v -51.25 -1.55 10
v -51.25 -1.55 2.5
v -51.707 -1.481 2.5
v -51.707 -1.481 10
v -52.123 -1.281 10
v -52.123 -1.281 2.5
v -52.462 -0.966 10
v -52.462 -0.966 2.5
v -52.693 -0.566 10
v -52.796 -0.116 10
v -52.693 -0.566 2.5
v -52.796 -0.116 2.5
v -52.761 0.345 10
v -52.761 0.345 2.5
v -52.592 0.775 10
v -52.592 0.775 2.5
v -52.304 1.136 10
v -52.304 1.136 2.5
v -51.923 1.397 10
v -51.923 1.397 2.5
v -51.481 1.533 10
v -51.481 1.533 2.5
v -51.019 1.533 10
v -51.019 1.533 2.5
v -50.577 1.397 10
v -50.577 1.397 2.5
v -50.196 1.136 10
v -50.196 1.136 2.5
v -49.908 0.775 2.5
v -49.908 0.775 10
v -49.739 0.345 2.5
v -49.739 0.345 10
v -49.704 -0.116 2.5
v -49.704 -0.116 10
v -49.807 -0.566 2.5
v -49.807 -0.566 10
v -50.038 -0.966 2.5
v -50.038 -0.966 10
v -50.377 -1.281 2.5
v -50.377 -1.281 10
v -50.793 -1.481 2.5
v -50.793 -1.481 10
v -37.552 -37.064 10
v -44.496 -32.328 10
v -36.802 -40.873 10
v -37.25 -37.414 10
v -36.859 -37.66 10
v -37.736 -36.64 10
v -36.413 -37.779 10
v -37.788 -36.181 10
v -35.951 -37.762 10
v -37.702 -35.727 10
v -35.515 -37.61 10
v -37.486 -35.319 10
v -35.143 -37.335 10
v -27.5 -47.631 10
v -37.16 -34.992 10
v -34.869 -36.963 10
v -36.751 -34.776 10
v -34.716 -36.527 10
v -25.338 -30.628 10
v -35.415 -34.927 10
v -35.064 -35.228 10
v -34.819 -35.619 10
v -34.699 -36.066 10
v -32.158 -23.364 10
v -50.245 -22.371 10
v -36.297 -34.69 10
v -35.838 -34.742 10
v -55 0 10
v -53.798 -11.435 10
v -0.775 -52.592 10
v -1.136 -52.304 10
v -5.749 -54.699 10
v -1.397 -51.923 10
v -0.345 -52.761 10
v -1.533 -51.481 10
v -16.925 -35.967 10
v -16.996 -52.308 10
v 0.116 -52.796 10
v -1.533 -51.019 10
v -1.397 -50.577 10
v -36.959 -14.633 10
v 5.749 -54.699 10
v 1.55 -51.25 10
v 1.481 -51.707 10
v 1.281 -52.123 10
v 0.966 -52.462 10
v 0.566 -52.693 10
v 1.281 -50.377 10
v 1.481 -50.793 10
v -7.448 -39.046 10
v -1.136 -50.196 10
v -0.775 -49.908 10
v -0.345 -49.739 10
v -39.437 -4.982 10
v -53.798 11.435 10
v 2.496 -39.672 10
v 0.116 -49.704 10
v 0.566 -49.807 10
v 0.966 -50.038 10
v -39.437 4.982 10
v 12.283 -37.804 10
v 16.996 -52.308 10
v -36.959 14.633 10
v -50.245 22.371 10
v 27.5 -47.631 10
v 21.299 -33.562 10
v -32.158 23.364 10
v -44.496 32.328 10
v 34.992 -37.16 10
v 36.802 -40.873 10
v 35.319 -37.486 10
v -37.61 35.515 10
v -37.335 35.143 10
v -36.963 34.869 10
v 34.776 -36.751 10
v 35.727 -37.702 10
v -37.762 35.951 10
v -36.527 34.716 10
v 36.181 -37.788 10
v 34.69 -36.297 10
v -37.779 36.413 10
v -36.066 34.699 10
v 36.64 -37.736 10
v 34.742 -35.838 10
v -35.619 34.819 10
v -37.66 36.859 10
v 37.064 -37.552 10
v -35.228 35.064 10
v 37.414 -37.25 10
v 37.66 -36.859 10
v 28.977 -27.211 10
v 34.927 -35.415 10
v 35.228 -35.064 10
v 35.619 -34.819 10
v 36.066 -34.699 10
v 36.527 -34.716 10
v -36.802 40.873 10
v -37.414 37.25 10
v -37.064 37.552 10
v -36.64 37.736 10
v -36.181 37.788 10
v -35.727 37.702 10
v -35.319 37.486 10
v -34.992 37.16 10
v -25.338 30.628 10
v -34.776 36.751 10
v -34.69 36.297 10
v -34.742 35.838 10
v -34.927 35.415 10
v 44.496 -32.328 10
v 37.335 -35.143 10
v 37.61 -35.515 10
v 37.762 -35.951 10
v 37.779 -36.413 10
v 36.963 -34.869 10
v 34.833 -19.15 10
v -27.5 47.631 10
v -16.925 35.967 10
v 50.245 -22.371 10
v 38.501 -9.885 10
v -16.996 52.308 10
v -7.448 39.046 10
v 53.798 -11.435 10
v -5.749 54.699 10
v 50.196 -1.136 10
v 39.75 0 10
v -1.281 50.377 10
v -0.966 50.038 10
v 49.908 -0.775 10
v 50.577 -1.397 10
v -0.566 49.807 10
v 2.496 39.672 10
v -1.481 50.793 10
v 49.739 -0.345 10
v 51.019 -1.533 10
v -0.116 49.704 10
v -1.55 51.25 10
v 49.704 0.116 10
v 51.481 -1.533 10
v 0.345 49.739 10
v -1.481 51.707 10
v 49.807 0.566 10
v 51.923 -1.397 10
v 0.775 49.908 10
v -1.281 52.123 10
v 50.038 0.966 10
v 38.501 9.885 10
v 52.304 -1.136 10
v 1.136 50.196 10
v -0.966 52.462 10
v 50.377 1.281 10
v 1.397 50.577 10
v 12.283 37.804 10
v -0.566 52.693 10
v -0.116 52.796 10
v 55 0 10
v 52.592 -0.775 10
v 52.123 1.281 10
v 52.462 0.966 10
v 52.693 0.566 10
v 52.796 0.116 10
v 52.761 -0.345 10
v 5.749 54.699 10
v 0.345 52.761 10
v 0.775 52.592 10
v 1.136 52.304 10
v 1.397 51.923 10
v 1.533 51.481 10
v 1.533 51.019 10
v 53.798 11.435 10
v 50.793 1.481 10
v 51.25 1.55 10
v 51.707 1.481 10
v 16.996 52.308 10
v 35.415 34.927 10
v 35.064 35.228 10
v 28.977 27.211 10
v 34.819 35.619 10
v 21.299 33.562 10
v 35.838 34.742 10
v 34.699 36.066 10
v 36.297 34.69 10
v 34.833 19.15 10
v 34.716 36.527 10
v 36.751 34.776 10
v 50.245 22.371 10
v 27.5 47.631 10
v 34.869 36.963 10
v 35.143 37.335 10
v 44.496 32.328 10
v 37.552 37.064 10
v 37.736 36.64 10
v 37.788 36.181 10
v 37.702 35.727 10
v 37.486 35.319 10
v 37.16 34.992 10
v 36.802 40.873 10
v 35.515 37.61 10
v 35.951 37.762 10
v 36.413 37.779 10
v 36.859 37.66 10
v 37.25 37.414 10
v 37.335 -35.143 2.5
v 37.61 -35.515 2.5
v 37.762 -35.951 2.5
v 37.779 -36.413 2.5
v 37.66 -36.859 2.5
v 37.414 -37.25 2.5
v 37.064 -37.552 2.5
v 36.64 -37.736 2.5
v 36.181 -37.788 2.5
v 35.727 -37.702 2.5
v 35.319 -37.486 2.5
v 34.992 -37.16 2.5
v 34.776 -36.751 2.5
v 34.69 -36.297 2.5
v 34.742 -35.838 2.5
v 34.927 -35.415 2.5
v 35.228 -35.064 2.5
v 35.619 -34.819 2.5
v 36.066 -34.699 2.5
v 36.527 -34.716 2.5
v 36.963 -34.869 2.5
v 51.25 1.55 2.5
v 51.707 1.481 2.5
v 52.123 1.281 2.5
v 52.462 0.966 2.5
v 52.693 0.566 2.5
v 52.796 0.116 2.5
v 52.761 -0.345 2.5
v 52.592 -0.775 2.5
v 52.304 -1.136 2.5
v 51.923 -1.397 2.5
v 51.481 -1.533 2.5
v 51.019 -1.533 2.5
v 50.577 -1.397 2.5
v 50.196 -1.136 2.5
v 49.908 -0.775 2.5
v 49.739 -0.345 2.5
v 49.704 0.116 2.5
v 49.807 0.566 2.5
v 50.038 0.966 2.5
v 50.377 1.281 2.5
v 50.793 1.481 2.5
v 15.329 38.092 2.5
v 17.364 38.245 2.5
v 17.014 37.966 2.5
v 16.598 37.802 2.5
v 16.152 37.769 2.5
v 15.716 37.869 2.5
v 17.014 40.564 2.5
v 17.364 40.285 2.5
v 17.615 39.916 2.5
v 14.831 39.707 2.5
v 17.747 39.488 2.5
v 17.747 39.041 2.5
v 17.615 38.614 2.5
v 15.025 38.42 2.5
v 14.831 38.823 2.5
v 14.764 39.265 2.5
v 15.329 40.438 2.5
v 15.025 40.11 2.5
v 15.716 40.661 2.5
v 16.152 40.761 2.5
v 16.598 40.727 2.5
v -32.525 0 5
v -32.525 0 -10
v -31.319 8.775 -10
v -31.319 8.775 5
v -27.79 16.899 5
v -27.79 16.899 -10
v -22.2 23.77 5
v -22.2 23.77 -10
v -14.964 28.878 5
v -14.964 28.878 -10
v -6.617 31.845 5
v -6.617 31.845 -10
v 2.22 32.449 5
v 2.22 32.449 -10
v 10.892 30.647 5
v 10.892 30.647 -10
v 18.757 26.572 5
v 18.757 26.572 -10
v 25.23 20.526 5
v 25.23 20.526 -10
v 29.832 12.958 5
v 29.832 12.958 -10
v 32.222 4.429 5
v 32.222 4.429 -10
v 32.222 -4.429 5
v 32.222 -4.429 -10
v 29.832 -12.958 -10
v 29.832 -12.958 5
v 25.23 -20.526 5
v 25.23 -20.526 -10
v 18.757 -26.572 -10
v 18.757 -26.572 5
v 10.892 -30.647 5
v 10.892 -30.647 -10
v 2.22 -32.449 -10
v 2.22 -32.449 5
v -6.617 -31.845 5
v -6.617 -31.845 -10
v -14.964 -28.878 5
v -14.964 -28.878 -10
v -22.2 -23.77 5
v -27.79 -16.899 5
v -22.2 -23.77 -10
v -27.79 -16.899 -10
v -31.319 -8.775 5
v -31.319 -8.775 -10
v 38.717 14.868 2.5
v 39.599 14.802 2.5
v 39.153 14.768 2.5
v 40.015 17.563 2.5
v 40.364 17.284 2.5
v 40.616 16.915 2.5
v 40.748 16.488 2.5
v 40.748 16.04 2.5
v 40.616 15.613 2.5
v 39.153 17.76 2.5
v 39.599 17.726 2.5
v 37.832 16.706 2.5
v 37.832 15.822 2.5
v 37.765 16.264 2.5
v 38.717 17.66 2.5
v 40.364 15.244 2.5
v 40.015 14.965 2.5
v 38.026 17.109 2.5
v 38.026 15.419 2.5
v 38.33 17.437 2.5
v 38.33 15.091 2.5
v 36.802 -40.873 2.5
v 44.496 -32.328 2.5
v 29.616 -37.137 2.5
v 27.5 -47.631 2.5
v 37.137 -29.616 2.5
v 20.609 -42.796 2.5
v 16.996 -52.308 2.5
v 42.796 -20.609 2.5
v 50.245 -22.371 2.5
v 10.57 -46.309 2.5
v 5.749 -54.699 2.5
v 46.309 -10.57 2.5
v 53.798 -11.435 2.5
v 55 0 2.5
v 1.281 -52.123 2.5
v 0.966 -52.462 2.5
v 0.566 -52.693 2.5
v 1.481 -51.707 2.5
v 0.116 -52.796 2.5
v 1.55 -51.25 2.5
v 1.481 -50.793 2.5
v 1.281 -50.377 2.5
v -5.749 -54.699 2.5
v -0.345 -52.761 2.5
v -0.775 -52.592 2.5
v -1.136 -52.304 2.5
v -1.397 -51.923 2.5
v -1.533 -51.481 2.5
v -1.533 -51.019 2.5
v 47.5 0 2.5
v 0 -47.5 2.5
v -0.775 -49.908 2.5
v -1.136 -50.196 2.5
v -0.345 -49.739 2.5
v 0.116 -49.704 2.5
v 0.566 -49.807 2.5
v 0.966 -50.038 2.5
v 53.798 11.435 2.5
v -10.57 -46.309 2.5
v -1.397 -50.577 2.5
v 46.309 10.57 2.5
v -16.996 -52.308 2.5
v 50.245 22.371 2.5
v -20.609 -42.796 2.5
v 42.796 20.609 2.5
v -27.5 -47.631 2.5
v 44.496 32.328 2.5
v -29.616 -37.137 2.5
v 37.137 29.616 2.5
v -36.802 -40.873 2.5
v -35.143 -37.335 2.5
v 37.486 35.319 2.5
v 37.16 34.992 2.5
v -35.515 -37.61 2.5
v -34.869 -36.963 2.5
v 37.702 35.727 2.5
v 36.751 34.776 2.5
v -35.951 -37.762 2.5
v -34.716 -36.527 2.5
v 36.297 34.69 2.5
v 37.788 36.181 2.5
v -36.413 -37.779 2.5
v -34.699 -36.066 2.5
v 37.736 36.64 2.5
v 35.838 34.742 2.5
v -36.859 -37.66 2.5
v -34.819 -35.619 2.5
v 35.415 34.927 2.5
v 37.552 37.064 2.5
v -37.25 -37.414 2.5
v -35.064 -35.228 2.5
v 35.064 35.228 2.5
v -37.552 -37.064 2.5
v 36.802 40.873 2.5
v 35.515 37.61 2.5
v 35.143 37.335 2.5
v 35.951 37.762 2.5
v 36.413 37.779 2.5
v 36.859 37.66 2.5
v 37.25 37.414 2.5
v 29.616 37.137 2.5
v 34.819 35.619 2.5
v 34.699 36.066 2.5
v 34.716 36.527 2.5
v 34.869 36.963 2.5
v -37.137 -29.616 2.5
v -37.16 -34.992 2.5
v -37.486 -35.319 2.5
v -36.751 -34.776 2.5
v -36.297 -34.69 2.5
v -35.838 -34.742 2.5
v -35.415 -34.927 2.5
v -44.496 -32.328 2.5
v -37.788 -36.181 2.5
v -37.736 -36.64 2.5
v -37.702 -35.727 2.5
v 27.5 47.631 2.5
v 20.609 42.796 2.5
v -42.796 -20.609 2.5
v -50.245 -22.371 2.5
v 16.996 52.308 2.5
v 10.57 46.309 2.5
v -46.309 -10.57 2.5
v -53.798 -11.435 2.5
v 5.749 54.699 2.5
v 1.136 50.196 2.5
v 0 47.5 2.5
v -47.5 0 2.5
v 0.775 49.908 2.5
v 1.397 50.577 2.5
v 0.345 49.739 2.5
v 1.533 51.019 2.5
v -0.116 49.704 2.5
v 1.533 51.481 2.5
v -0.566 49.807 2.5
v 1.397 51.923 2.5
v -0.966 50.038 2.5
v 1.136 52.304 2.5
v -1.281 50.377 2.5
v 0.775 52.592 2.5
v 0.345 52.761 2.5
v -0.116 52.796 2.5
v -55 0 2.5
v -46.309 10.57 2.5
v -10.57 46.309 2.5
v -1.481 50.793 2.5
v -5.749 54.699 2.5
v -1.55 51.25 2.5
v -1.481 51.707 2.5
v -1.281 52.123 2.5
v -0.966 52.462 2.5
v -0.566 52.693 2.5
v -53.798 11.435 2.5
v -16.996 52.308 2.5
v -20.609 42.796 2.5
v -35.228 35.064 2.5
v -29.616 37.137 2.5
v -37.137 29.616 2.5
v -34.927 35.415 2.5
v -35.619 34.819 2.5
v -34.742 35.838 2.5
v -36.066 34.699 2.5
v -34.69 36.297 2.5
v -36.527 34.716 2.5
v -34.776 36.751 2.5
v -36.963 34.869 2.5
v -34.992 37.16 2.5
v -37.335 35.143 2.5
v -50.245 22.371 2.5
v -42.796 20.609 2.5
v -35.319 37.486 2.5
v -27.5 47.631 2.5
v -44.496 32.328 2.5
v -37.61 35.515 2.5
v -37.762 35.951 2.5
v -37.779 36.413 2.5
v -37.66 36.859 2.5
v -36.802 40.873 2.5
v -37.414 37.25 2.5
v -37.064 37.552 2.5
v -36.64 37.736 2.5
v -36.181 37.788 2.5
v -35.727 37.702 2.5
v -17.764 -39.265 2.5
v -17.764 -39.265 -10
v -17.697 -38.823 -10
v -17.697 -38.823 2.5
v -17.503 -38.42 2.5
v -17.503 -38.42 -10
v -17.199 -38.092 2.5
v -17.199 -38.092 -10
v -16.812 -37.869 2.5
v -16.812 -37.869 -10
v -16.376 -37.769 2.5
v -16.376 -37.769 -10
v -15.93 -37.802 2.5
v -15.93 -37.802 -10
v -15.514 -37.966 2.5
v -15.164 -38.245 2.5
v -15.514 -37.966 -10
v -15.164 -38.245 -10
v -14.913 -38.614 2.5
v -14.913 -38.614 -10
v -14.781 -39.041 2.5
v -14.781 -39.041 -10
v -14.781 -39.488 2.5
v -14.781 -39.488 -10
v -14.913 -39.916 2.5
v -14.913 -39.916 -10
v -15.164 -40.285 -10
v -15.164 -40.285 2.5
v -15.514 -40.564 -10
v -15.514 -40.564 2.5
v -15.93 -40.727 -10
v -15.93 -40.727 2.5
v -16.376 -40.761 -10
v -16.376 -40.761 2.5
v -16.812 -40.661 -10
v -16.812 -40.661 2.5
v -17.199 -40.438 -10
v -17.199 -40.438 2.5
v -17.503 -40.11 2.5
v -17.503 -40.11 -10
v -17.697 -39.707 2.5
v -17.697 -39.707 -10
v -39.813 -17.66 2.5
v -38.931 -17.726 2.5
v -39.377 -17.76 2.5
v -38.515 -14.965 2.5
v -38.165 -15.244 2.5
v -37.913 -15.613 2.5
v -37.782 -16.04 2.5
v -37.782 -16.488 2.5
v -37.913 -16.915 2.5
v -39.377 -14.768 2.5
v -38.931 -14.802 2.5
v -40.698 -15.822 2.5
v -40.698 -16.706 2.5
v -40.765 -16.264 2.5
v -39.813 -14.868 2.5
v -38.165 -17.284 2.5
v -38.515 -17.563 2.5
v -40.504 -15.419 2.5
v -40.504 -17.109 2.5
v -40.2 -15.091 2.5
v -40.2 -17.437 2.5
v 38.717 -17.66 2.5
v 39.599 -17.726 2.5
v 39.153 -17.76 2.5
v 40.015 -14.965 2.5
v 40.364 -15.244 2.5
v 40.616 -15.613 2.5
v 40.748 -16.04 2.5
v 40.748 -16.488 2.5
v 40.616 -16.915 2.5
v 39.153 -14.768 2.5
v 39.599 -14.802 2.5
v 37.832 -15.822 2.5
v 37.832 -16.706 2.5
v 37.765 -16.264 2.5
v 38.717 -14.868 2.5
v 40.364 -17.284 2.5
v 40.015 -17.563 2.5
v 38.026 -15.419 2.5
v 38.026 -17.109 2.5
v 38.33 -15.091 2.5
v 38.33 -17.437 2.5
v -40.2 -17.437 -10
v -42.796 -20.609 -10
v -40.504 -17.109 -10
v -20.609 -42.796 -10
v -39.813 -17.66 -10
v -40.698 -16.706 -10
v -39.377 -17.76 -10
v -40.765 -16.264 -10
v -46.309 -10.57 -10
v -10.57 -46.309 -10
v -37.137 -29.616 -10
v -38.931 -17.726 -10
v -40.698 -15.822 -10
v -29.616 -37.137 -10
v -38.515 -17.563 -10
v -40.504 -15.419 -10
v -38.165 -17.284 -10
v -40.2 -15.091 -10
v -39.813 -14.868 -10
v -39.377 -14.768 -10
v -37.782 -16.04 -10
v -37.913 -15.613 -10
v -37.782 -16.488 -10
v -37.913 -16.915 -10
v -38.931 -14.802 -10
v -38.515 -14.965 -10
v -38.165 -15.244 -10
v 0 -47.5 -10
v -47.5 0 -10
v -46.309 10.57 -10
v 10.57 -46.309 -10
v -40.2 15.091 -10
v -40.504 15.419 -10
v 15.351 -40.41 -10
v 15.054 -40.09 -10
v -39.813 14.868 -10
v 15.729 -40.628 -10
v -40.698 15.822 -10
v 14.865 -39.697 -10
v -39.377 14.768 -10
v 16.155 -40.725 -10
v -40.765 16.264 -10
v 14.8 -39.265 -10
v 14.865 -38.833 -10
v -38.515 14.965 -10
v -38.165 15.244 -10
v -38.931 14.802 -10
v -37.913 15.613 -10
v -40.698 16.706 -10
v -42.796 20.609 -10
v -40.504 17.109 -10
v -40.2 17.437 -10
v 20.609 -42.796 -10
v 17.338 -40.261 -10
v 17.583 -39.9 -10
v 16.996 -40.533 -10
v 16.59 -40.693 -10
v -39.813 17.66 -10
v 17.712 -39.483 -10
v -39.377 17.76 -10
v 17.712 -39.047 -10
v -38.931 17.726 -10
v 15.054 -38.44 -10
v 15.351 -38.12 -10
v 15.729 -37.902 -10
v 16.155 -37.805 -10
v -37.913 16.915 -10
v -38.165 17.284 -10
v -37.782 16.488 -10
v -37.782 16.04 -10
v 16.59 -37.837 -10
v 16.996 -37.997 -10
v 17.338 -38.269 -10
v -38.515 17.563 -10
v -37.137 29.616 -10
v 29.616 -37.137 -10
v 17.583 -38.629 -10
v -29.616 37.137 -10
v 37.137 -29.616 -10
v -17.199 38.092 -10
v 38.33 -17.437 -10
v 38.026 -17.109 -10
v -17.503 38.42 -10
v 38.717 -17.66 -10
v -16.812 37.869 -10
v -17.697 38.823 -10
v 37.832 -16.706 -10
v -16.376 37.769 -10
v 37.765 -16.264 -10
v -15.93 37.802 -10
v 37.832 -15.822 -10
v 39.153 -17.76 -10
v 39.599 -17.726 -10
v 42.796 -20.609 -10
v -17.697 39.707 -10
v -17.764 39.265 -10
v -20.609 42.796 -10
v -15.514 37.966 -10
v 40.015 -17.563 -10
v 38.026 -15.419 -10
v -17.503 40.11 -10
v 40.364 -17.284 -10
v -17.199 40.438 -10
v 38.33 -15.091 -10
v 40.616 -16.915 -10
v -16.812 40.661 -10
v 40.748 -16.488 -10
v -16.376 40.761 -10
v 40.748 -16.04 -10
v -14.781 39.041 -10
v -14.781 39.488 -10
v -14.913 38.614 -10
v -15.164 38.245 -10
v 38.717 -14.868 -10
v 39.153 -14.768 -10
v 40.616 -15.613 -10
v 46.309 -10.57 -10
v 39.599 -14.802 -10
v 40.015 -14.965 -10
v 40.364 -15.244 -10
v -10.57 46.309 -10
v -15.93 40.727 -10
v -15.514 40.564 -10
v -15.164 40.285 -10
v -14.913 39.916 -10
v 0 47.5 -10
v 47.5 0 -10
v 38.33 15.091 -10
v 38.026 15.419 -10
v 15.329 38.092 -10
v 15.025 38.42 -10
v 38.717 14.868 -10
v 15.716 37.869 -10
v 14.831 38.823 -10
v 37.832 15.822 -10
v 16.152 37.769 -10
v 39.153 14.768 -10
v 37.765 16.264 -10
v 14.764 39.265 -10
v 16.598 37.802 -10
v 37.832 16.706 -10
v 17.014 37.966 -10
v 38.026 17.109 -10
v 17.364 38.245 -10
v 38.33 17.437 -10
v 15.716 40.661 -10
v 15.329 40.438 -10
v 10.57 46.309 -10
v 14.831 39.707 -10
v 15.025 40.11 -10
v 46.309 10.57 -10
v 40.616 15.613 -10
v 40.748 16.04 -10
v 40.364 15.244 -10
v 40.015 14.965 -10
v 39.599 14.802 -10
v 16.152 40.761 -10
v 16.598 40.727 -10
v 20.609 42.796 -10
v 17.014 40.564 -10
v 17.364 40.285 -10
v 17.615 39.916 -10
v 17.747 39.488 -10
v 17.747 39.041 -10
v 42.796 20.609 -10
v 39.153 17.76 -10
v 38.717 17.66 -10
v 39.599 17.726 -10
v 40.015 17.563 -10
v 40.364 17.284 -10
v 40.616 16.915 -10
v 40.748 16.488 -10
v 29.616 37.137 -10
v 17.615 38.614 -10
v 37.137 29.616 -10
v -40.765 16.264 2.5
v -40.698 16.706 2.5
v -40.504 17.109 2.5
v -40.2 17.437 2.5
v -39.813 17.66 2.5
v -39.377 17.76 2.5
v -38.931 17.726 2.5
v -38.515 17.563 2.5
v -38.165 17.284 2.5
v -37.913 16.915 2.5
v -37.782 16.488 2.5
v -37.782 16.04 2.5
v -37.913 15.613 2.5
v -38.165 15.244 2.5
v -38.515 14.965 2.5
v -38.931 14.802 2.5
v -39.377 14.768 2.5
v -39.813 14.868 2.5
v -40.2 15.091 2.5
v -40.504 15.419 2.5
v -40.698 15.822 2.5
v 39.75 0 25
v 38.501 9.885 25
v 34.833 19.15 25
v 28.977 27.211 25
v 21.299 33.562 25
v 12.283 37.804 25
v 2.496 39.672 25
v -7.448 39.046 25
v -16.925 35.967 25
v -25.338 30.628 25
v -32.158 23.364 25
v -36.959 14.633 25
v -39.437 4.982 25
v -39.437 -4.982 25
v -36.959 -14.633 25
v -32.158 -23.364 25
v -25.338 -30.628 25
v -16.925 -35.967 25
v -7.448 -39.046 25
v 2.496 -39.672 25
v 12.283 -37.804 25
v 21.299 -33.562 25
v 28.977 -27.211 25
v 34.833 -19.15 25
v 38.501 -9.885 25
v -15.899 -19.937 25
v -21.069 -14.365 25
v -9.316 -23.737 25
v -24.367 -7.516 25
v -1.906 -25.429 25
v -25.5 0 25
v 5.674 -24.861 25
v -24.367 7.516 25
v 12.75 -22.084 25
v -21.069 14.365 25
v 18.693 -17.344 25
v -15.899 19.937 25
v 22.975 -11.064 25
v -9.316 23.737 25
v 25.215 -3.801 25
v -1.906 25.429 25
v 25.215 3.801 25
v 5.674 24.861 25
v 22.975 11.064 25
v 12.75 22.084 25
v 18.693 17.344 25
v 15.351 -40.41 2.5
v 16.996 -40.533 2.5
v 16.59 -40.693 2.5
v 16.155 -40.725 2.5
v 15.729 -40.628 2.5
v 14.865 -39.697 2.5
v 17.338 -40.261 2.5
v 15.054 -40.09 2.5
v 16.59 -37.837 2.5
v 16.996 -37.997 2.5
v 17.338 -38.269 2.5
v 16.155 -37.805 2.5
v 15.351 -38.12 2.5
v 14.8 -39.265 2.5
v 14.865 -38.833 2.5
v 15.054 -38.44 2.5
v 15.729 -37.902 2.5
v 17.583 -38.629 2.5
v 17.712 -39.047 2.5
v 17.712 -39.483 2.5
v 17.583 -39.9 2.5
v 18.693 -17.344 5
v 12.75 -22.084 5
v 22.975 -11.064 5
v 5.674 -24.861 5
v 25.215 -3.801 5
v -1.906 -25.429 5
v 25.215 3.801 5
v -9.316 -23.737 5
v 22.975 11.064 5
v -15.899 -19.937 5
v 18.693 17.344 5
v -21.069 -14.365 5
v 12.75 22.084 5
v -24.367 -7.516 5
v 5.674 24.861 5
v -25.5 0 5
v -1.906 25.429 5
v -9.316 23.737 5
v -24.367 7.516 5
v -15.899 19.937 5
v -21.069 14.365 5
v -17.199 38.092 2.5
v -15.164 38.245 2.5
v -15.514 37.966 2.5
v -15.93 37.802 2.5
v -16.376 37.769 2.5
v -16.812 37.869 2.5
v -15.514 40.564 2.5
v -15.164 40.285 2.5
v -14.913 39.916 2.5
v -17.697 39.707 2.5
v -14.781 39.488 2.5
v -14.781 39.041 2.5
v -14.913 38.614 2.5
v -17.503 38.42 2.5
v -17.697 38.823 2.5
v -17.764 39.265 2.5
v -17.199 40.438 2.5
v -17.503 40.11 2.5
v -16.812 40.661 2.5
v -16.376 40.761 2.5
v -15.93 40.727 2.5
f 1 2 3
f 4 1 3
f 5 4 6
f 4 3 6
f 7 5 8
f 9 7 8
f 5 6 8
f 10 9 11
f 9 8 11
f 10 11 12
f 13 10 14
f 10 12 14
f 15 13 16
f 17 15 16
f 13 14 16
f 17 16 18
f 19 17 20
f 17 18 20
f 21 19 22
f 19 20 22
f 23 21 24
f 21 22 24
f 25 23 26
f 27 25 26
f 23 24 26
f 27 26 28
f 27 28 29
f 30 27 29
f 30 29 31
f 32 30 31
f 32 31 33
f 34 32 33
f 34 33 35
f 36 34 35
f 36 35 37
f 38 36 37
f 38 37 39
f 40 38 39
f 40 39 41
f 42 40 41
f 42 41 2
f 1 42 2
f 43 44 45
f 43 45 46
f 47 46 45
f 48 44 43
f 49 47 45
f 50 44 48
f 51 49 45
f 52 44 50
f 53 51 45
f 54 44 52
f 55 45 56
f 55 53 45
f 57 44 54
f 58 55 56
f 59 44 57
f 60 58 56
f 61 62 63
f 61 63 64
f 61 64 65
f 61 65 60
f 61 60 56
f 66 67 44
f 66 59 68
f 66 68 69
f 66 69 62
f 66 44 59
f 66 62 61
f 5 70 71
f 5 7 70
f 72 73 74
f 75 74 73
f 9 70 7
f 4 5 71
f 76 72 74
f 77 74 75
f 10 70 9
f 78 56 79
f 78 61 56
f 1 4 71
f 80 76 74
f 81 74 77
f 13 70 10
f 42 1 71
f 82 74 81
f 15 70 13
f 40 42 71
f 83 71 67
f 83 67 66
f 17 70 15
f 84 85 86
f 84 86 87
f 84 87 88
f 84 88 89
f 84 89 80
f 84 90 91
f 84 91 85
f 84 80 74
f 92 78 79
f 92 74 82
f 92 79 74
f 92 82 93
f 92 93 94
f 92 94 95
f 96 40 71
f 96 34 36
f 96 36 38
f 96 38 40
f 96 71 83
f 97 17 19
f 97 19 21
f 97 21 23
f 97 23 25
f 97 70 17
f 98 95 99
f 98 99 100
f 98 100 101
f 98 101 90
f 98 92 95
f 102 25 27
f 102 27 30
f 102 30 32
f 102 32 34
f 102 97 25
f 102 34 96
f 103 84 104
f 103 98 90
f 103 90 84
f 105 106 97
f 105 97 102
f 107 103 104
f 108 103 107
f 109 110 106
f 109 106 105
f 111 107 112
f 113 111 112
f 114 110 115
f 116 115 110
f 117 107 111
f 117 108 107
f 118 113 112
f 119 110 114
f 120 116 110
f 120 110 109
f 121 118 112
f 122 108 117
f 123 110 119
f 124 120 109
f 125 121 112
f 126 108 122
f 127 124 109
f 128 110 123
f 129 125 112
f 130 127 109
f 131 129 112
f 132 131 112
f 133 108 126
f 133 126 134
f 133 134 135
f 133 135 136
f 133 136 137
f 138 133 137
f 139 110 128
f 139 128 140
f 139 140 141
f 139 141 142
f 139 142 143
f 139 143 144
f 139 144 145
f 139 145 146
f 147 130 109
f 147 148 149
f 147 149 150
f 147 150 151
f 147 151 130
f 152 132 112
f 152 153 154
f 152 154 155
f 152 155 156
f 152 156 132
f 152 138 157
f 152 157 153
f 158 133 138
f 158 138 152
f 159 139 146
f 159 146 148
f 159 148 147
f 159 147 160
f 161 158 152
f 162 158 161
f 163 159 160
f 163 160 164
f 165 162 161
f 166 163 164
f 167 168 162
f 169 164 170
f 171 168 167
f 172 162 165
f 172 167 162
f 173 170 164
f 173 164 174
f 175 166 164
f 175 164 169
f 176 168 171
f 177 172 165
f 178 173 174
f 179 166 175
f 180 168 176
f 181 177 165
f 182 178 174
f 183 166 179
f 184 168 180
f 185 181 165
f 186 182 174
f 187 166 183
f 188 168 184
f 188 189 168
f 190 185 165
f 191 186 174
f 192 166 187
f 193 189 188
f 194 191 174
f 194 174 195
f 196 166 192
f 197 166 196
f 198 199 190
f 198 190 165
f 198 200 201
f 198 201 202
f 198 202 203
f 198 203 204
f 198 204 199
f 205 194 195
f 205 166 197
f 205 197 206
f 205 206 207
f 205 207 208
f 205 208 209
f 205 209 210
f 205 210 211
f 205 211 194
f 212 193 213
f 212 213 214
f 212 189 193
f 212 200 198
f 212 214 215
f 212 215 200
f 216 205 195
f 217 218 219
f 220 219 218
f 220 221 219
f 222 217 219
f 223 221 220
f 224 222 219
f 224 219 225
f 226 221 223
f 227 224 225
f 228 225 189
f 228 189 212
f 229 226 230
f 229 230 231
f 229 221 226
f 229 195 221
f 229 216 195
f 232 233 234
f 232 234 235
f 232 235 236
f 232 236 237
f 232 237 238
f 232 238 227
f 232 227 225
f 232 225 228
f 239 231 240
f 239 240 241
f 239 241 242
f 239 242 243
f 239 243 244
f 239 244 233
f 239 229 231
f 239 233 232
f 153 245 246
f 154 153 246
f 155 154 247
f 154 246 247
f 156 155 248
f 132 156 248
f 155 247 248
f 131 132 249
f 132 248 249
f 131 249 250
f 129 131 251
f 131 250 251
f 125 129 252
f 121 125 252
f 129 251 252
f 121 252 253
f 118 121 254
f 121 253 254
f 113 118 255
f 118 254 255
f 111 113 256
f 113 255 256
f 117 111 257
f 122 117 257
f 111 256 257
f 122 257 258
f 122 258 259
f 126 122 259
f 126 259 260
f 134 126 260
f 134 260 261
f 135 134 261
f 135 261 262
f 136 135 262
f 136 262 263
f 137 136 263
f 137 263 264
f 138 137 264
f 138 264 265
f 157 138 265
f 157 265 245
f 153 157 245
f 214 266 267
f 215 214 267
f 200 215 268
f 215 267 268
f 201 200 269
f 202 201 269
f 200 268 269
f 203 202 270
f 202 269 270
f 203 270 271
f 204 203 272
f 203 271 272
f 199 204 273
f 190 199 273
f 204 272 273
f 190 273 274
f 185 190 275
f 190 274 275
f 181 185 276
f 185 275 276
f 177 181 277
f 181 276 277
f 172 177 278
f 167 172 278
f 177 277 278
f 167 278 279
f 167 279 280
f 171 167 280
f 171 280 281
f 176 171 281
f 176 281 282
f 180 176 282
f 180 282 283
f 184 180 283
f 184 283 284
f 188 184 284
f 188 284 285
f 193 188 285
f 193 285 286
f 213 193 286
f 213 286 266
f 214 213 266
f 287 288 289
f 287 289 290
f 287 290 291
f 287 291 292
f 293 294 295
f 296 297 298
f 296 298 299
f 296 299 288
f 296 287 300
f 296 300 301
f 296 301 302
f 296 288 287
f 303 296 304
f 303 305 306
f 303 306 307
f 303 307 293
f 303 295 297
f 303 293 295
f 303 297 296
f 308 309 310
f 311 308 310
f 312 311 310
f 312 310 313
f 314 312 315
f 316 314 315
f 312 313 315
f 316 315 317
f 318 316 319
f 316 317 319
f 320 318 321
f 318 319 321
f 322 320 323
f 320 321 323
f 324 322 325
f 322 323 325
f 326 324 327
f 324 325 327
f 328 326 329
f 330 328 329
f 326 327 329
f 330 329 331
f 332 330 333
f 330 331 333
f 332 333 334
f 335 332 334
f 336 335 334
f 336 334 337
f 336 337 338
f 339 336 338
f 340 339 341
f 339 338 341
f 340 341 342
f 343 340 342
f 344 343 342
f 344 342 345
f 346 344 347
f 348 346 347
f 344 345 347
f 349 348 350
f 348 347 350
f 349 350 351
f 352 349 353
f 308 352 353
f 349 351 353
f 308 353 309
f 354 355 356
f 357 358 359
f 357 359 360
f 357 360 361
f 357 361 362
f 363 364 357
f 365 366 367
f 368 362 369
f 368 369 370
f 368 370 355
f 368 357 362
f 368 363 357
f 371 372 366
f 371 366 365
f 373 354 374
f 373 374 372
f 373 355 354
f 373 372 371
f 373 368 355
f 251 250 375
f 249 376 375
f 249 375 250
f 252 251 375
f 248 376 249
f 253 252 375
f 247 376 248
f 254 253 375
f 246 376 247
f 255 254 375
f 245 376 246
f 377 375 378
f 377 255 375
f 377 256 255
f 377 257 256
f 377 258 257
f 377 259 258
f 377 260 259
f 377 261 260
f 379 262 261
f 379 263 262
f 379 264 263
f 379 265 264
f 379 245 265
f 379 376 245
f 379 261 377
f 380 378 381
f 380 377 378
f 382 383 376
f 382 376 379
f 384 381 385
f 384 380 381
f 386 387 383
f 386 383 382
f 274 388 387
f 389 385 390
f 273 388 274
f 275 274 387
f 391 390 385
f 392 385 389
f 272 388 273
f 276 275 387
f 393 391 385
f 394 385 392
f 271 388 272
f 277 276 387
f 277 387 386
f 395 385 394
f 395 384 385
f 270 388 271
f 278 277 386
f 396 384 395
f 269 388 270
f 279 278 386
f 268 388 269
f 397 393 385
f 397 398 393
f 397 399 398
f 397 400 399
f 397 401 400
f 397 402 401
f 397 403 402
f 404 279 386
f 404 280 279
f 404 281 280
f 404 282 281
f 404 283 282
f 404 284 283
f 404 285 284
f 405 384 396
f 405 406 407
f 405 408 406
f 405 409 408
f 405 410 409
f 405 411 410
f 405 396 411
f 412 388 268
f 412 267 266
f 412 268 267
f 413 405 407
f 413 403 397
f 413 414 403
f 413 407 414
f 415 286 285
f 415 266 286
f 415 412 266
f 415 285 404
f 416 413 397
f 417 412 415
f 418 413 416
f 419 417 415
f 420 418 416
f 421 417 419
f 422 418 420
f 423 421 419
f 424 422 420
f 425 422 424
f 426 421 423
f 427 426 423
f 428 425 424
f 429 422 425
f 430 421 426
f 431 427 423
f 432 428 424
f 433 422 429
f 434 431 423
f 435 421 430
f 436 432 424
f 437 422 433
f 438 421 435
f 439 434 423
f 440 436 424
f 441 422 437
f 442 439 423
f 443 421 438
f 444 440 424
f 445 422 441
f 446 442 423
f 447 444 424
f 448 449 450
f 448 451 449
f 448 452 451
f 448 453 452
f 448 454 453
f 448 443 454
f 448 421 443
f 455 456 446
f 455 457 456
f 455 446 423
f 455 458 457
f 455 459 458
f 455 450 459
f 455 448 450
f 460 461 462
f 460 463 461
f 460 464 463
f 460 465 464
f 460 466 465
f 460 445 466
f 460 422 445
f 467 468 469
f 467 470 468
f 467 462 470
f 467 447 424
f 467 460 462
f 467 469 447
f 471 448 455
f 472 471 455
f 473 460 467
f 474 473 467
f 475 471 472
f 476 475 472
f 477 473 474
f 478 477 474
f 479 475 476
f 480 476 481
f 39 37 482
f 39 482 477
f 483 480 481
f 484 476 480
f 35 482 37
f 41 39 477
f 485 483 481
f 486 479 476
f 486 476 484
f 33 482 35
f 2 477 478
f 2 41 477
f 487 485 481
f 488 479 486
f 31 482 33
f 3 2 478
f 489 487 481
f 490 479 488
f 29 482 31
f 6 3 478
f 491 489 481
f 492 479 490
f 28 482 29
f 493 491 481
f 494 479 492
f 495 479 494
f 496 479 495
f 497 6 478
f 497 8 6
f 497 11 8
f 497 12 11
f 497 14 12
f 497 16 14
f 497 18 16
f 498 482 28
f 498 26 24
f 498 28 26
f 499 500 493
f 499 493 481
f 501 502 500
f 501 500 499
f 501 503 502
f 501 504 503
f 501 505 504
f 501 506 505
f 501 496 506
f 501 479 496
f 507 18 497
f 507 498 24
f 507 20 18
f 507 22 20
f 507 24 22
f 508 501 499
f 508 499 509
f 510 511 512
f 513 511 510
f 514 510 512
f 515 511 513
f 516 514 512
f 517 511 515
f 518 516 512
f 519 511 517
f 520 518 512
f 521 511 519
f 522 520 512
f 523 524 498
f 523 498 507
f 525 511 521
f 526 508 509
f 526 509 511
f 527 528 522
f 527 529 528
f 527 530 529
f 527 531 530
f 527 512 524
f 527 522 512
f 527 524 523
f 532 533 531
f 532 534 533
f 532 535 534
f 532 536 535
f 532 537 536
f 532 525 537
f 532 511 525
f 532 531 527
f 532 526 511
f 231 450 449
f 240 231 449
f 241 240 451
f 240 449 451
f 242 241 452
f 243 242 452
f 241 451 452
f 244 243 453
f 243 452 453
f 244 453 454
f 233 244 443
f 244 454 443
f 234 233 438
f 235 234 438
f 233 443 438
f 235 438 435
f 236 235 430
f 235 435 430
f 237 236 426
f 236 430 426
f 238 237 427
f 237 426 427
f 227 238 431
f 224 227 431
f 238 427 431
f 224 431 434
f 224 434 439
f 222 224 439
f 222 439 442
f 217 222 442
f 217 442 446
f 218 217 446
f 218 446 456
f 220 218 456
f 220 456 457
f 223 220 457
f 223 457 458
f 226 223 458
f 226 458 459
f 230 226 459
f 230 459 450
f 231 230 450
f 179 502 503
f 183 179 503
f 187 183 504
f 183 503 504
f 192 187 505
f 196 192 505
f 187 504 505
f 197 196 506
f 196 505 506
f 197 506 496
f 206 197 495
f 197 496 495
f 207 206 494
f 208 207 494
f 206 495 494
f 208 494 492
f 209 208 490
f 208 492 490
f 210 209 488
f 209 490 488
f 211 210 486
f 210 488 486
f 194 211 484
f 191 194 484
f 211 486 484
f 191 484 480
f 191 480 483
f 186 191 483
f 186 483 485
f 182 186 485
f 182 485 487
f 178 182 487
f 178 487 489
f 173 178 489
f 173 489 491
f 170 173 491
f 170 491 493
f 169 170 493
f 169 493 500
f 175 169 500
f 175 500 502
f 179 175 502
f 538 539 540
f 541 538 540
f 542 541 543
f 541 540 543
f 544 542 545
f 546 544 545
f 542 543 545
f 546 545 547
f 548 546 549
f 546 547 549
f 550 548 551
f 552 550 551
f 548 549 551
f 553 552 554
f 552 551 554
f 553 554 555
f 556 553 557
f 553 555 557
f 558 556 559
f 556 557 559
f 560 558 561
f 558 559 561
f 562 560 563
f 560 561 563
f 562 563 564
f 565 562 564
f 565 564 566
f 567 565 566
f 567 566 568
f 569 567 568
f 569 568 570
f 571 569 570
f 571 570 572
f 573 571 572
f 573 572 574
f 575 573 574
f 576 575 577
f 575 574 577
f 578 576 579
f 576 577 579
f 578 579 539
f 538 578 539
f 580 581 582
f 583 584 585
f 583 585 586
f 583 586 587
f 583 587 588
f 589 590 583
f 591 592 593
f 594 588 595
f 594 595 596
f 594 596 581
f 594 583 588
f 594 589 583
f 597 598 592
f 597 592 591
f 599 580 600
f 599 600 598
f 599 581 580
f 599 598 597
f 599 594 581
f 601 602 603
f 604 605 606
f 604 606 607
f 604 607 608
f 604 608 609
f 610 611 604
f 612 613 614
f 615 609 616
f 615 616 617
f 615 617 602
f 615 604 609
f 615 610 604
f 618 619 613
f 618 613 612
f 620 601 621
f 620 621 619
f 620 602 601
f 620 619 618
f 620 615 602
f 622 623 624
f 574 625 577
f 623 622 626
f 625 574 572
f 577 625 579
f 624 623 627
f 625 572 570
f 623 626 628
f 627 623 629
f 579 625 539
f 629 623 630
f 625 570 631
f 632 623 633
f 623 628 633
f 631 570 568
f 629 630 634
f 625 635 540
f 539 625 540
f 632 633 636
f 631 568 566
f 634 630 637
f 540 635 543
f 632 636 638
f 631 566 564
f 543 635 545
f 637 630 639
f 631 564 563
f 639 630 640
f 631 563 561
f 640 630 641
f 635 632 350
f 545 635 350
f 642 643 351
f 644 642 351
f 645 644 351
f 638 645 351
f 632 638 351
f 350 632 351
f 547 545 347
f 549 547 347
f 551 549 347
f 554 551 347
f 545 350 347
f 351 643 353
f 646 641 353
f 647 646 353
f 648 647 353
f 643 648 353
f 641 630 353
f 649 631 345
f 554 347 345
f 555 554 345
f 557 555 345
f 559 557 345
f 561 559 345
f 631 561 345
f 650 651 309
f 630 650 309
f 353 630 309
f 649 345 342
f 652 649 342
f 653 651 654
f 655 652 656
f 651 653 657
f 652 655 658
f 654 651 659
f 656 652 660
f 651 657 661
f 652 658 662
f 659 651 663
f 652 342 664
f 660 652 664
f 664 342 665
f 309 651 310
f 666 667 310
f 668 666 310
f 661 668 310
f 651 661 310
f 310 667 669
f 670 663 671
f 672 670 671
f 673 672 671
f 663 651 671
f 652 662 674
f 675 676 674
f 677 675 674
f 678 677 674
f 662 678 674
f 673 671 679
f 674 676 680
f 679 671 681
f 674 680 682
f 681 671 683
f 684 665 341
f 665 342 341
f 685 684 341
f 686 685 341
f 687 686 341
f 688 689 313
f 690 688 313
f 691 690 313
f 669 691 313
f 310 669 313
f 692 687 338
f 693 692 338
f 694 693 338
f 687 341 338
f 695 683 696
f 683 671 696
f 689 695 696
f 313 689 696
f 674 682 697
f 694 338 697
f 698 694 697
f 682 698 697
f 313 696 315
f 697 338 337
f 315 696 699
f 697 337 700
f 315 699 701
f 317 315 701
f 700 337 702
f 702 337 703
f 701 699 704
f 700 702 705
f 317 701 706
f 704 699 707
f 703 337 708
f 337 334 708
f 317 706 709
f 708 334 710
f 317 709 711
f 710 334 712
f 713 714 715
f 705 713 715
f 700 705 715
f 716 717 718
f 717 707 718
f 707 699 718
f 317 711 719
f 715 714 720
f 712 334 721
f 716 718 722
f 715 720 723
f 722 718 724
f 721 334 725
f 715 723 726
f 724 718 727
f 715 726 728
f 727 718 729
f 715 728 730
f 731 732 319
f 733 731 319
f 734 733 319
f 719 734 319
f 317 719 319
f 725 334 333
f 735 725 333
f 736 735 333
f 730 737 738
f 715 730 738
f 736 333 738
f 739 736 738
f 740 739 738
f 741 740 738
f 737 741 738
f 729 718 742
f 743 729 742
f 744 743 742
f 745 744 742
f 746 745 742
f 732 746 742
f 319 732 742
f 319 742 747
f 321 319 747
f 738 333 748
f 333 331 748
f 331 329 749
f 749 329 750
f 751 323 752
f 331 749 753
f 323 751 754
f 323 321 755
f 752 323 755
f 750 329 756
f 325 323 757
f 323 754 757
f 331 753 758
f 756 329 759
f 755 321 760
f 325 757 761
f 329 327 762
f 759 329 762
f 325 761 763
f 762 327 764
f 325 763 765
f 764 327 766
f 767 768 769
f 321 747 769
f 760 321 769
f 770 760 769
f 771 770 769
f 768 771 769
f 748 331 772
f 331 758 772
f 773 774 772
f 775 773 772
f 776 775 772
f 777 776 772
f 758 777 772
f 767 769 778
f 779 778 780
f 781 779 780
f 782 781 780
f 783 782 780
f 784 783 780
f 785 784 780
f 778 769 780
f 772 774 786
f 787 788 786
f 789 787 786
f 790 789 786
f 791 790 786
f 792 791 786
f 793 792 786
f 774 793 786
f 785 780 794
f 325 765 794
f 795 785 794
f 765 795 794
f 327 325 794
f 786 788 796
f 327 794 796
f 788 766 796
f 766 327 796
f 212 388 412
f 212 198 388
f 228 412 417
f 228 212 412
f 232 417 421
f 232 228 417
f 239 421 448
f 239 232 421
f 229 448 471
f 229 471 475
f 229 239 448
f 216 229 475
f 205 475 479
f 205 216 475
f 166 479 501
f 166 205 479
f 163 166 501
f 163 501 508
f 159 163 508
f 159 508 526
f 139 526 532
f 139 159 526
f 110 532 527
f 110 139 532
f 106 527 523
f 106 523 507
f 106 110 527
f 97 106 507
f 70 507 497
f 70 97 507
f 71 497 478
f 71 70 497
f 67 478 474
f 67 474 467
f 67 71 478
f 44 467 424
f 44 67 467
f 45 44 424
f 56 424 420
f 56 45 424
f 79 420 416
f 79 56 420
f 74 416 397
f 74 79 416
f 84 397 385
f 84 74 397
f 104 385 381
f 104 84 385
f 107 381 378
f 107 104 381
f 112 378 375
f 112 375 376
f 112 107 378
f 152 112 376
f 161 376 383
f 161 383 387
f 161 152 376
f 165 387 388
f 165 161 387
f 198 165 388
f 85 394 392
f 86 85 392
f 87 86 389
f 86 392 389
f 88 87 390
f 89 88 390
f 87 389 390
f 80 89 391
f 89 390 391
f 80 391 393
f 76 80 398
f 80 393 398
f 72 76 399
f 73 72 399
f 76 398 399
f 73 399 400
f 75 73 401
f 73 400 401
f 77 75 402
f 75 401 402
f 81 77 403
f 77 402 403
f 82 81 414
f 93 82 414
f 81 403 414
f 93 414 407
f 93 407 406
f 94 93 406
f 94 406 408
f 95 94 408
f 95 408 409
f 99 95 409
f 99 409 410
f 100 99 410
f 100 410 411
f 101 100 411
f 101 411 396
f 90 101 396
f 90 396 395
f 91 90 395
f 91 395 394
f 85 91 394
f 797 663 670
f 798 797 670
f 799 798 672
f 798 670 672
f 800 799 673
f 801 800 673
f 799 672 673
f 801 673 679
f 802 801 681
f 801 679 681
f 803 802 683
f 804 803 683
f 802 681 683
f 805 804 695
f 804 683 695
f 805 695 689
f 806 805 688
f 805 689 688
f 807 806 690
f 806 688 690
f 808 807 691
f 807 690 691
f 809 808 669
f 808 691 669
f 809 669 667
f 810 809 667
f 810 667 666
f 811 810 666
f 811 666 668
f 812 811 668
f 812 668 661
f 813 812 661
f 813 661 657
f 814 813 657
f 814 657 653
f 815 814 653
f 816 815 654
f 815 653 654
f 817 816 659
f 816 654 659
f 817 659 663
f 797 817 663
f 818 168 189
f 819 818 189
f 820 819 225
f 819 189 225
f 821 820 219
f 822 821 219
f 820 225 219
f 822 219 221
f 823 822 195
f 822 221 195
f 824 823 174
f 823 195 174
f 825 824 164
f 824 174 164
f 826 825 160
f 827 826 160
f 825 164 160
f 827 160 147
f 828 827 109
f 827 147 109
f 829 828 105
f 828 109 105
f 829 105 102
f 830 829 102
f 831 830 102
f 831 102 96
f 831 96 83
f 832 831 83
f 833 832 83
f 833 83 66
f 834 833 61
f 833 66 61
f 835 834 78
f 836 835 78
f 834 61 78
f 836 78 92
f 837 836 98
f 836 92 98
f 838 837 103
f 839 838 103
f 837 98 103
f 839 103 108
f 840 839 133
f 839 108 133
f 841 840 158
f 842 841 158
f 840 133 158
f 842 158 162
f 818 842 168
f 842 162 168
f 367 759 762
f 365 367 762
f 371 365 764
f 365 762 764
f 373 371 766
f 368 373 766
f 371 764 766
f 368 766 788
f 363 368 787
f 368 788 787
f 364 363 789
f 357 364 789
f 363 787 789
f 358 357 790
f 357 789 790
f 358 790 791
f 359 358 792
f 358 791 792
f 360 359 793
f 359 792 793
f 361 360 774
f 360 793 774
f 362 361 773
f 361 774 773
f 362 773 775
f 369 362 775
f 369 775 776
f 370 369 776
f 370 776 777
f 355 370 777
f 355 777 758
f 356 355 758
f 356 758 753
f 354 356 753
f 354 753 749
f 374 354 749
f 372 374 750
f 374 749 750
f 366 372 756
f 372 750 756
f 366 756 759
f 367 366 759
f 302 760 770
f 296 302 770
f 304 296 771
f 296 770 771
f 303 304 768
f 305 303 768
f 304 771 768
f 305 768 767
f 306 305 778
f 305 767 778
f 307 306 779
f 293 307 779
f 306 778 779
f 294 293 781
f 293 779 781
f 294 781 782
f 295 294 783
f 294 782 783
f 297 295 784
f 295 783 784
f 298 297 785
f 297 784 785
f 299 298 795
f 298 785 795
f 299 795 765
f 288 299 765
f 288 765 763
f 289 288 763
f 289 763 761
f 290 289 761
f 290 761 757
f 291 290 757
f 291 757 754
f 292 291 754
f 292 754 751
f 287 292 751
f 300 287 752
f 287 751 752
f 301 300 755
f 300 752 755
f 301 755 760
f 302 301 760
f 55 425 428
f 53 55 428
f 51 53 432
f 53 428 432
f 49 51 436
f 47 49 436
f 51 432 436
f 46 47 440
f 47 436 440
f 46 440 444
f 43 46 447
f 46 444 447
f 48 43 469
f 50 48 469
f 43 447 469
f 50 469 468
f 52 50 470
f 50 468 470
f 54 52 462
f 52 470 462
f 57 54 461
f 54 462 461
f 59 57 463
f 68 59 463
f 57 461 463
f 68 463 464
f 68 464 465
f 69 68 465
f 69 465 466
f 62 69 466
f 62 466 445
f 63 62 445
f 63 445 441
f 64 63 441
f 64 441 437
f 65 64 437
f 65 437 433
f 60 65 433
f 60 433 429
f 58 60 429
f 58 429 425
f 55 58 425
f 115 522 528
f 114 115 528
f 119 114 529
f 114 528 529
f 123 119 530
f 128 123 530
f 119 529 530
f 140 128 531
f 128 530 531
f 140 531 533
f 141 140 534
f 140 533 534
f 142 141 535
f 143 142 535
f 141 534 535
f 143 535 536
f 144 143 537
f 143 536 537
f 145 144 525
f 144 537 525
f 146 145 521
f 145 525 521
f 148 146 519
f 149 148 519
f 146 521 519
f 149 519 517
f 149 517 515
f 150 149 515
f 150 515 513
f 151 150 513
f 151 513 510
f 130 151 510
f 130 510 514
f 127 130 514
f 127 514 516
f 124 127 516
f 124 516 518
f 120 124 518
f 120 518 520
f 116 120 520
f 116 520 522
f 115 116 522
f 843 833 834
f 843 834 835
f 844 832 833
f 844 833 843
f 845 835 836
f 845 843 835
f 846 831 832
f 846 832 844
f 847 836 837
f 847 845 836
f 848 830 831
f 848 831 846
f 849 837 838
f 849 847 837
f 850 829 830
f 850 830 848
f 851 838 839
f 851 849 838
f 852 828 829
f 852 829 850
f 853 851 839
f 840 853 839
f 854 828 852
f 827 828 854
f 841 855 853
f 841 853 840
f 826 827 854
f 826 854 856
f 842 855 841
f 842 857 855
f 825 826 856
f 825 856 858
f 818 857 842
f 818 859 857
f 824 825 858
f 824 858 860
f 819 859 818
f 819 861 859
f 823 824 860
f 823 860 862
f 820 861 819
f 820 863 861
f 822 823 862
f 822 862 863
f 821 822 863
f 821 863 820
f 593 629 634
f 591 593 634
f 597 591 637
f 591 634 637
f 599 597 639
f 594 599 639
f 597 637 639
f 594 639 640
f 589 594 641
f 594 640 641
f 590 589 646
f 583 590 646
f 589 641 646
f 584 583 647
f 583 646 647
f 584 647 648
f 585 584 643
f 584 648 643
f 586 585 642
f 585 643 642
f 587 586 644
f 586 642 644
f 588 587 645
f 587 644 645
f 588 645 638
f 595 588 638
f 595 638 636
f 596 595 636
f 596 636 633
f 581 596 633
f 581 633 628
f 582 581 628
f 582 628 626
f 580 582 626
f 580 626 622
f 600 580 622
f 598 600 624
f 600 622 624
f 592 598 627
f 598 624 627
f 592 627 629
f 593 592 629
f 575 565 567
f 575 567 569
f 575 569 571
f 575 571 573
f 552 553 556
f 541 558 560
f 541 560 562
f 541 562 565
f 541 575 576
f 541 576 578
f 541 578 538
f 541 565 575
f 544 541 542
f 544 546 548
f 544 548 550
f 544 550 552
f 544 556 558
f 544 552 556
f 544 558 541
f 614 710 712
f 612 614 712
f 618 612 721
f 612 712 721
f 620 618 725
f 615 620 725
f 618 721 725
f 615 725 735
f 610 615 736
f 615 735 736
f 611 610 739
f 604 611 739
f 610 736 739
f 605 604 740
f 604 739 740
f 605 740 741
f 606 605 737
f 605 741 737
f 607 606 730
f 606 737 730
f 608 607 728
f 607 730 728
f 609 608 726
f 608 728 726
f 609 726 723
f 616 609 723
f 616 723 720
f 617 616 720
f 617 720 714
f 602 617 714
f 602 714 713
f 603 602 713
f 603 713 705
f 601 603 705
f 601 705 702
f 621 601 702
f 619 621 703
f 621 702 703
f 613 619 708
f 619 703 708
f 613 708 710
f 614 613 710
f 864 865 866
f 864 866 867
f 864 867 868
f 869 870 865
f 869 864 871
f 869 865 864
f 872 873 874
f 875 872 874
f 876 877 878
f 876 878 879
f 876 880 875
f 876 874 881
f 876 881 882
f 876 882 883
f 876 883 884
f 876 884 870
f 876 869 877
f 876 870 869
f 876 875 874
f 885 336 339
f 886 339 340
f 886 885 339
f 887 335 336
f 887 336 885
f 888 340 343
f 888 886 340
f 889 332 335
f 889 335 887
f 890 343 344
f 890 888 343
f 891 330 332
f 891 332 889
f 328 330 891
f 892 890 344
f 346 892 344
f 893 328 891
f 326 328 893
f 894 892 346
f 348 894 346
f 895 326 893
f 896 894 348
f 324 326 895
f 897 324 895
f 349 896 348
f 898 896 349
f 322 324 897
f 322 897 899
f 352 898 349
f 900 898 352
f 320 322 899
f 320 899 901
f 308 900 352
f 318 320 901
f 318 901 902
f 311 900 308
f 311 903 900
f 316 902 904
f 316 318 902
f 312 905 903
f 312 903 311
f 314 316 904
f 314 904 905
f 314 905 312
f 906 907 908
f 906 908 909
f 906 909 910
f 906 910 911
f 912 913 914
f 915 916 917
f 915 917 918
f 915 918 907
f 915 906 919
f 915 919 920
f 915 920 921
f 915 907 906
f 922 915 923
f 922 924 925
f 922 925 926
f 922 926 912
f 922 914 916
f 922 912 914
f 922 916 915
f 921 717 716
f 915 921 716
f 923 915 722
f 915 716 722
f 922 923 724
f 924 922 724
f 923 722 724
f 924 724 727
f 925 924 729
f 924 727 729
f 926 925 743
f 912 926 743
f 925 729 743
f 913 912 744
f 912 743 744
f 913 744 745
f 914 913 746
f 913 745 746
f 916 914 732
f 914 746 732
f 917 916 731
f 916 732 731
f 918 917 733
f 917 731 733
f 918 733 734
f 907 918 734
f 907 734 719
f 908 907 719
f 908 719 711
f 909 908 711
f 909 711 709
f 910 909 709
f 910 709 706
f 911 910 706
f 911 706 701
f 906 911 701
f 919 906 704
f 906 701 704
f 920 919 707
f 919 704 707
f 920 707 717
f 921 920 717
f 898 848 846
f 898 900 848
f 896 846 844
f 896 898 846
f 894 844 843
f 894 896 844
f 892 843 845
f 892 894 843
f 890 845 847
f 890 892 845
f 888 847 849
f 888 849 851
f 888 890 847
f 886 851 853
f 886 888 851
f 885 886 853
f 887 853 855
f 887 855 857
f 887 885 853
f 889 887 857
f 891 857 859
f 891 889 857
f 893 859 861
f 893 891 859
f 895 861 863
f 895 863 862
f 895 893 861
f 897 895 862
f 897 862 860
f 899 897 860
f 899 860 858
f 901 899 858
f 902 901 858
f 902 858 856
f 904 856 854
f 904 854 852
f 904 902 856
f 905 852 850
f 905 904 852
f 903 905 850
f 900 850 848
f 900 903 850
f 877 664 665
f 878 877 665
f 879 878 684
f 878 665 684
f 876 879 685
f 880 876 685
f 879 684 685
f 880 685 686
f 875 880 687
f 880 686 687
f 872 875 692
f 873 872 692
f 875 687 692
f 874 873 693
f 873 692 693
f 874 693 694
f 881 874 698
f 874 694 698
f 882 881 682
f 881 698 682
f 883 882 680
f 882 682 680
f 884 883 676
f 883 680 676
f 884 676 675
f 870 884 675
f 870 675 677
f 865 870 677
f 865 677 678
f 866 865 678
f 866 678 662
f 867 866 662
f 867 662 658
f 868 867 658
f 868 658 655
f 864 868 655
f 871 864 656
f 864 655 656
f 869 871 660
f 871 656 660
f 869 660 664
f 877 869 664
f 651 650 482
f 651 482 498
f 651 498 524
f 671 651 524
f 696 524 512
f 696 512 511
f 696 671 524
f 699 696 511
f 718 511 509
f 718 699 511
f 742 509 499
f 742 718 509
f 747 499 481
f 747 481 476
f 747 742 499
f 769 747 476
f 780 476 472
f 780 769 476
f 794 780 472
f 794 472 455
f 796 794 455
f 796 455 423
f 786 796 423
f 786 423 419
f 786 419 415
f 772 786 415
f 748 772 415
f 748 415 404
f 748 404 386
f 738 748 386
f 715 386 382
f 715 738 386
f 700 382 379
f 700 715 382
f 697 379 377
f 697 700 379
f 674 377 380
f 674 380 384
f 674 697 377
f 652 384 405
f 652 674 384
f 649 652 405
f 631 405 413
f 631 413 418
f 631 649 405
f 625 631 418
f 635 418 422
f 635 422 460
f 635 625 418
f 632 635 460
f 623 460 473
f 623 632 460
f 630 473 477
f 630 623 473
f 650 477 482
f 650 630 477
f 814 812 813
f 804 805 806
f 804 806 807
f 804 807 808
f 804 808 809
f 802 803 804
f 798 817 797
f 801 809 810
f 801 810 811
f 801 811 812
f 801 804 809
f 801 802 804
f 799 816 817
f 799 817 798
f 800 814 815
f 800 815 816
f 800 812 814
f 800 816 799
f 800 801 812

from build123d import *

# Parameters (mm, degrees)
IZIM1_R                     = 55
Y_KSEKLIK_EKSTR_ZYON1_DEPTH = 10
IZIM2_OUTSIDE_W             = 143.368
IZIM2_OUTSIDE_H             = 143.368
IZIM2_OUTSIDE_R             = 47.5
KES_EKSTR_ZYON1_DEPTH       = 12.5
IZIM3_R                     = 1.55
KES_EKSTR_ZYON2_DEPTH       = 79.779756283
DAIRESEL_KAPLAMA1_COUNT     = 8
IZIM5_R                     = 32.525
KES_EKSTR_ZYON3_DEPTH       = 15
IZIM6_R                     = 25.5
KES_EKSTR_ZYON4_DEPTH       = 80.214897589
IZIM7_R                     = 39.75
IZIM7_R_2                   = 25.5
Y_KSEKLIK_EKSTR_ZYON2_DEPTH = 15
IZIM8_R                     = 1.5
IZIM8_R_2                   = 1.464466486
KES_EKSTR_ZYON5_DEPTH       = 12.5


with BuildPart() as part:
    # Çizim1 → Yükseklik-Ekstrüzyon1 (new, symmetric)
    with BuildSketch(Plane.XY):
        Circle(IZIM1_R)
    extrude(amount=Y_KSEKLIK_EKSTR_ZYON1_DEPTH, both=True)

    # Çizim2 outside → Kes-Ekstrüzyon1 (cut)
    with BuildSketch(Plane(origin=(0, 0, -10), x_dir=(-1, 0, 0), z_dir=(0, 0, -1))):
        Rectangle(IZIM2_OUTSIDE_W, IZIM2_OUTSIDE_H)
        Circle(IZIM2_OUTSIDE_R, mode=Mode.SUBTRACT)
    extrude(amount=-KES_EKSTR_ZYON1_DEPTH, mode=Mode.SUBTRACT)

    # Çizim3 → Kes-Ekstrüzyon2 (cut, through all)
    with BuildSketch(Plane(origin=(0, 0, 2.5), x_dir=(-1, 0, 0), z_dir=(0, 0, -1))):
        with Locations((0, 51.25)):
            Circle(IZIM3_R)
    kes_ekstr_zyon2 = extrude(amount=-KES_EKSTR_ZYON2_DEPTH, mode=Mode.SUBTRACT)

    # Dairesel Kaplama1: Kes-Ekstrüzyon2 ×8 about axis
    dairesel_kaplama1_axis = Axis((0, 0, 0), (0, 0, 1))
    for i in range(1, DAIRESEL_KAPLAMA1_COUNT):
        add(kes_ekstr_zyon2.rotate(dairesel_kaplama1_axis, i * 360 / DAIRESEL_KAPLAMA1_COUNT), mode=Mode.SUBTRACT)

    # Çizim5 → Kes-Ekstrüzyon3 (cut)
    with BuildSketch(Plane(origin=(0, 0, -10), x_dir=(-1, 0, 0), z_dir=(0, 0, -1))):
        Circle(IZIM5_R)
    extrude(amount=-KES_EKSTR_ZYON3_DEPTH, mode=Mode.SUBTRACT)

    # Çizim6 → Kes-Ekstrüzyon4 (cut, through all)
    with BuildSketch(Plane(origin=(0, 0, 5), x_dir=(-1, 0, 0), z_dir=(0, 0, -1))):
        Circle(IZIM6_R)
    extrude(amount=-KES_EKSTR_ZYON4_DEPTH, mode=Mode.SUBTRACT)

    # Çizim7 → Yükseklik-Ekstrüzyon2 (add)
    with BuildSketch(Plane.XY.offset(10)):
        Circle(IZIM7_R)
        with Locations(Location((0, 0, 0), (0, 0, 180))):
            Circle(IZIM7_R_2, mode=Mode.SUBTRACT)
    extrude(amount=Y_KSEKLIK_EKSTR_ZYON2_DEPTH)

    # Çizim8 → Kes-Ekstrüzyon5 (cut)
    with BuildSketch(Plane(origin=(0, 0, -10), x_dir=(-1, 0, 0), z_dir=(0, 0, -1))):
        with Locations((16.264045876, -39.264880132)):
            Circle(IZIM8_R)
        with Locations((39.264880132, -16.264045876)):
            Circle(IZIM8_R)
        with Locations((-16.264045876, -39.264880132)):
            Circle(IZIM8_R_2)
        with Locations((-39.264880132, -16.264045876)):
            Circle(IZIM8_R)
        with Locations((39.264880132, 16.264045876)):
            Circle(IZIM8_R)
        with Locations((16.264045876, 39.264880132)):
            Circle(IZIM8_R)
        with Locations((-16.264045876, 39.264880132)):
            Circle(IZIM8_R)
        with Locations((-39.264880132, 16.264045876)):
            Circle(IZIM8_R)
    extrude(amount=-KES_EKSTR_ZYON5_DEPTH, mode=Mode.SUBTRACT)


solid = part.part
